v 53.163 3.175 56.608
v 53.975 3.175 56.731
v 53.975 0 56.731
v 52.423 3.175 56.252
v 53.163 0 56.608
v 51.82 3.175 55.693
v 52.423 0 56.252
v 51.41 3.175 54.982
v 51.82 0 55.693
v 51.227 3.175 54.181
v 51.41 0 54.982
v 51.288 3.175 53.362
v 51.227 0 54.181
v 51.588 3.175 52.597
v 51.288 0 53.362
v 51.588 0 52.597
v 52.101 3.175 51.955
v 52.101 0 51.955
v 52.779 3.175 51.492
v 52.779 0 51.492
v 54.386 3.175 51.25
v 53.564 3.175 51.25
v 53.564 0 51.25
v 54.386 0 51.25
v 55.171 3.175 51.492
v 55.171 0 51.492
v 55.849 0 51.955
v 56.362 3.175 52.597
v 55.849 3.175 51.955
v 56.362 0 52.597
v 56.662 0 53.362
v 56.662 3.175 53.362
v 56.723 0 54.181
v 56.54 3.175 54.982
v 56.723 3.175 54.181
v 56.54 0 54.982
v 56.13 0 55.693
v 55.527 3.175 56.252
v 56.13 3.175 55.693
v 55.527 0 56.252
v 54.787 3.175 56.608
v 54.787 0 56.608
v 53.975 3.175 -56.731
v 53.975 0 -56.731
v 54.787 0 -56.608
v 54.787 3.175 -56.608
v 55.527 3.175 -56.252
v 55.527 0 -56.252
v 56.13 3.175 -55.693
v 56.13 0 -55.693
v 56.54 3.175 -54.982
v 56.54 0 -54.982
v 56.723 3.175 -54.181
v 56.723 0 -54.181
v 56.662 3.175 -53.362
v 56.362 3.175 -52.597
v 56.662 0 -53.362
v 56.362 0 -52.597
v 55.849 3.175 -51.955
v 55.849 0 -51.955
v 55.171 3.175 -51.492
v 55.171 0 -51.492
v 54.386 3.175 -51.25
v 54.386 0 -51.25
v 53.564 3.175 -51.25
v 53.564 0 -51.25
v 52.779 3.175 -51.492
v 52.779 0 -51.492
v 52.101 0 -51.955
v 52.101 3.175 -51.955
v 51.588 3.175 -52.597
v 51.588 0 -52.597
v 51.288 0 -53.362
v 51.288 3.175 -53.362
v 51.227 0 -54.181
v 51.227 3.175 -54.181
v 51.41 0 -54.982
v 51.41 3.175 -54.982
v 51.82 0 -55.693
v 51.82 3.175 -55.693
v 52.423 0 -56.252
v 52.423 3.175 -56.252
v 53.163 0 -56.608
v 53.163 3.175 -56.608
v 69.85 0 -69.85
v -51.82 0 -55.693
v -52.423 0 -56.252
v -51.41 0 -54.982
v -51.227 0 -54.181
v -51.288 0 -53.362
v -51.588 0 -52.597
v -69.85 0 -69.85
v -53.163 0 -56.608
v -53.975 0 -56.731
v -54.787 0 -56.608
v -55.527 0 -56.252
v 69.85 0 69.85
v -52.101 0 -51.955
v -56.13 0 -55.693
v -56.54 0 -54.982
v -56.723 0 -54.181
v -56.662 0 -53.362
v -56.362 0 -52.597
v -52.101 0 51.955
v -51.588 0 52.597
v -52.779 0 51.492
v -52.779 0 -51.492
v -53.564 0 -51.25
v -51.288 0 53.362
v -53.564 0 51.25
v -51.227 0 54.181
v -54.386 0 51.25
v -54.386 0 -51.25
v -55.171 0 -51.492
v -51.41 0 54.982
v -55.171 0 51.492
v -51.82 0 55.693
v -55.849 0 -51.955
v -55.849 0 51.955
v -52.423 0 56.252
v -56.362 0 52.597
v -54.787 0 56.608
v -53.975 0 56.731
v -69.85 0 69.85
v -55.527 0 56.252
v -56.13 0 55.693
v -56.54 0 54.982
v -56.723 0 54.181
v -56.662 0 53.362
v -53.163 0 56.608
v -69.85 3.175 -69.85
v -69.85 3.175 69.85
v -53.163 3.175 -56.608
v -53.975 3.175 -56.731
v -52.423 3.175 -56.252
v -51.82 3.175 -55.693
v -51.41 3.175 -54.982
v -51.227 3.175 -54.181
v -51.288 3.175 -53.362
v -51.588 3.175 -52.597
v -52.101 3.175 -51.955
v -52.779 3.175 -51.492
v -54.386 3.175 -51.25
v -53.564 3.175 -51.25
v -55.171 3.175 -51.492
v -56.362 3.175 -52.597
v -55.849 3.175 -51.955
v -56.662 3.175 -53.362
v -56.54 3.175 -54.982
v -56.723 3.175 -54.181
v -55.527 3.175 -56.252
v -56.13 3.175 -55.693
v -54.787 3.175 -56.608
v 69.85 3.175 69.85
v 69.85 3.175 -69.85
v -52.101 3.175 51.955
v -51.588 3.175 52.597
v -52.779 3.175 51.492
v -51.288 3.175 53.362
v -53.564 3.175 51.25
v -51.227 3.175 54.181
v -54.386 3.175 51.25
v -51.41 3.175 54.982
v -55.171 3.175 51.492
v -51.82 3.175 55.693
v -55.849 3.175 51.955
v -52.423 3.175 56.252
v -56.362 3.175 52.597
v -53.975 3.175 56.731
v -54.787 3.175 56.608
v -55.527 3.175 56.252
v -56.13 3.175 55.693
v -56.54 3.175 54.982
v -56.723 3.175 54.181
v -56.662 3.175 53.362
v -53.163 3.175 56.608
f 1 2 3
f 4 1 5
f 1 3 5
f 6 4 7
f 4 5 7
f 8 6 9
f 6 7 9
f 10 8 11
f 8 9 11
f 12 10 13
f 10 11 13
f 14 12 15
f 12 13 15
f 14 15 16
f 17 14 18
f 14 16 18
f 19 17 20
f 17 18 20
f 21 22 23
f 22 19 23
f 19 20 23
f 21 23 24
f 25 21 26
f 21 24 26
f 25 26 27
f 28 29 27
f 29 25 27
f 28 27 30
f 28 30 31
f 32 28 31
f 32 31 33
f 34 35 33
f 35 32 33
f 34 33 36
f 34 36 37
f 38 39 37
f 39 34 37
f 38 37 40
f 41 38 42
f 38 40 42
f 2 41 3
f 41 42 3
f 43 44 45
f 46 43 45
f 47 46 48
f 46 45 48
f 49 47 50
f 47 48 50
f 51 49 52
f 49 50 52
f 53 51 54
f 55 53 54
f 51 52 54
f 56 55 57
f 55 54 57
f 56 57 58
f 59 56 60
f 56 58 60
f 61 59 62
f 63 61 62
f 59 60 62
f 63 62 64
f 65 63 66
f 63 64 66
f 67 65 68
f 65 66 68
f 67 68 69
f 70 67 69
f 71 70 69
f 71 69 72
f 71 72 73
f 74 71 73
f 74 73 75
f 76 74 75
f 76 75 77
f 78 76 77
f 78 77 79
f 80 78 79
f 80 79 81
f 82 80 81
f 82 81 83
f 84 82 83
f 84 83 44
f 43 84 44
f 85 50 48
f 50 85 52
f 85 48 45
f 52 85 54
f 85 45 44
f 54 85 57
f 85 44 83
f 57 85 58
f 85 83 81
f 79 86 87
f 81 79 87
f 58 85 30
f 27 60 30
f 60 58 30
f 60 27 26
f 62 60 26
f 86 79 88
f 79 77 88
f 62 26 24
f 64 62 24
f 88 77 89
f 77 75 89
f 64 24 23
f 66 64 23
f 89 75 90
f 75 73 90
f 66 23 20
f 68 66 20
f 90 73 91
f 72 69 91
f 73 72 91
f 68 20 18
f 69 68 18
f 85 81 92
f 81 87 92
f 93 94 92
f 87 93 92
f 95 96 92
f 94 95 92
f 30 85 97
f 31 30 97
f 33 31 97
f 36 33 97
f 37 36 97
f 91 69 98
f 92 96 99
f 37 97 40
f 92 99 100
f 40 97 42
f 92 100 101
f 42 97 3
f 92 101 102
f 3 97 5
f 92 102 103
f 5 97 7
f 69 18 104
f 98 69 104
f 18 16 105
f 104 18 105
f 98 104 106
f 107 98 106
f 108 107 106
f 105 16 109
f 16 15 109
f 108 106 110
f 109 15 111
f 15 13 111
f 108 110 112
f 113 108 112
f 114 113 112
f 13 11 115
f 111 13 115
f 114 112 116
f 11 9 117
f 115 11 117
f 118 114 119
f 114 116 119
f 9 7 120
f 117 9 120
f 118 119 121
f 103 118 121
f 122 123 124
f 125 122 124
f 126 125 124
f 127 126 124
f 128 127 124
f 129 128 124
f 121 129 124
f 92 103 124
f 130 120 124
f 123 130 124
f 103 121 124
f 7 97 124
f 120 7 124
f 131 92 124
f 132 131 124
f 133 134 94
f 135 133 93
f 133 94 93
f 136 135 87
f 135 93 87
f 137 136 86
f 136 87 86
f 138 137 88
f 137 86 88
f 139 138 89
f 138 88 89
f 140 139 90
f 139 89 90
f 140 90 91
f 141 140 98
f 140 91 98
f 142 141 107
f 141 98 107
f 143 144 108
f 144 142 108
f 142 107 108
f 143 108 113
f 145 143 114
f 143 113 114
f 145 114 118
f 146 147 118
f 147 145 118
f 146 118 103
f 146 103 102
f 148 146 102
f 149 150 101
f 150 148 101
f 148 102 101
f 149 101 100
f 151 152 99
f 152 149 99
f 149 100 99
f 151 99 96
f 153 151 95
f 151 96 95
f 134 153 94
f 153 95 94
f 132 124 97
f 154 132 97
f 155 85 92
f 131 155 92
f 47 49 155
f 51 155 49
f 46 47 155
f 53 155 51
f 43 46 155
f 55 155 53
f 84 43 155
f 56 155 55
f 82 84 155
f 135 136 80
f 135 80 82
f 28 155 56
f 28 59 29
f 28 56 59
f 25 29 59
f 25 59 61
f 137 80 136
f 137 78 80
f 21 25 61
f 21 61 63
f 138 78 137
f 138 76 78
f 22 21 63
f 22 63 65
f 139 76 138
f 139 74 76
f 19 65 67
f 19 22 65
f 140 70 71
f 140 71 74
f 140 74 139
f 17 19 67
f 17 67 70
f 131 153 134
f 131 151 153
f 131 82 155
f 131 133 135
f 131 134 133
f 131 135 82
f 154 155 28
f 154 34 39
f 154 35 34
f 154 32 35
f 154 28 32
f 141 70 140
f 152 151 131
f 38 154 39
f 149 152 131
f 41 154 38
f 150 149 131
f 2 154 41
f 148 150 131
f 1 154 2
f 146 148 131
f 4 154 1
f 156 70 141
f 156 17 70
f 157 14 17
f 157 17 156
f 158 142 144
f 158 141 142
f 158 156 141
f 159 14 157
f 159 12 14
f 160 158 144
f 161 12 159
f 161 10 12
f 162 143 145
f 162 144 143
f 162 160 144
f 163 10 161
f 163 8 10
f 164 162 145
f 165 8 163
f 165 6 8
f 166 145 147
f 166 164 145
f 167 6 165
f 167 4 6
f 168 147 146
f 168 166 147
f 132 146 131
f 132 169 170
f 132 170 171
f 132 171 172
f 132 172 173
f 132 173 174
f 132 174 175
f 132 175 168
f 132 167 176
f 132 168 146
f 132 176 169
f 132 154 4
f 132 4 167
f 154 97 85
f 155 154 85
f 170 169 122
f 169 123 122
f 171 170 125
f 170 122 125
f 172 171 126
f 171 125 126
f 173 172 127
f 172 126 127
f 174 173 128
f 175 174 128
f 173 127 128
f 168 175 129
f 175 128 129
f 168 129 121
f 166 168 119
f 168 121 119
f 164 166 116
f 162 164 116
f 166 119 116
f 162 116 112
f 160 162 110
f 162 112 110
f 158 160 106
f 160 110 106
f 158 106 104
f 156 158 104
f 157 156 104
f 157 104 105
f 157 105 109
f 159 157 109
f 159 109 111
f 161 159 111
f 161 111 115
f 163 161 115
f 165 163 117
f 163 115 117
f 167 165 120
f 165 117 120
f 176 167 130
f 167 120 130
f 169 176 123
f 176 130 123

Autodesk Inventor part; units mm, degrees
ref_plane "YZ Plane" through (0, 0, 0) normal (1, 0, 0) x (0, 1, 0)
ref_plane "XZ Plane" through (0, 0, 0) normal (0, 1, 0) x (-1, 0, 0)
ref_plane "XY Plane" through (0, 0, 0) normal (0, 0, 1) x (1, 0, 0)
sketch "Sketch1" plane through (0, 0, 0) normal (0, 1, 0) x (-1, 0, 0)
  line L0 (69.85, 69.85) -> (-69.85, 69.85)
  line L1 (-69.85, 69.85) -> (-69.85, -69.85)
  line L2 (-69.85, -69.85) -> (69.85, -69.85)
  line L3 (69.85, -69.85) -> (69.85, 69.85)
  line L4 (97.79, 0) -> (-97.79, 0) projected
  line L5 (0, -97.79) -> (0, 97.79) projected
  point P0 (0, 0)
  dimension "d0" = 139.7
  dimension "d1" = 139.7
extrude "Extrusion1" add sketch "Sketch1" along normal blind 3.175
sketch "Sketch2" plane through (0, 3.175, 0) normal (0, 1, 0) x (1, 0, 0)
  line L0 (-69.85, 69.85) -> (-69.85, -69.85) projected
  line L1 (-69.85, -69.85) -> (-69.85, -53.975)
  line L2 (-69.85, -53.975) -> (-53.975, -53.975)
  point P0 (0, 0)
  dimension "d4" = 15.875
  dimension "d5" = 15.875
hole "Hole1" at (-53.975, 3.175, 53.975) direction (0, -1, 0) diameter 5.5118 depth 14.1986 tip angle 118 clearance for "Flat Head Machine Screw" size "M5" standard "Ansi Metric M Profile"
mirror "Mirror4" about plane through (0, 0, 0) normal (0, 0, 1) of "Hole1"
mirror "Mirror5" about plane through (0, 0, 0) normal (1, 0, 0) of "Hole1", "Mirror4"
equation "\"d0\" = d1"
equation "\"d4\" = d5"
properties part number "CH3-DiffHousingBottom"
